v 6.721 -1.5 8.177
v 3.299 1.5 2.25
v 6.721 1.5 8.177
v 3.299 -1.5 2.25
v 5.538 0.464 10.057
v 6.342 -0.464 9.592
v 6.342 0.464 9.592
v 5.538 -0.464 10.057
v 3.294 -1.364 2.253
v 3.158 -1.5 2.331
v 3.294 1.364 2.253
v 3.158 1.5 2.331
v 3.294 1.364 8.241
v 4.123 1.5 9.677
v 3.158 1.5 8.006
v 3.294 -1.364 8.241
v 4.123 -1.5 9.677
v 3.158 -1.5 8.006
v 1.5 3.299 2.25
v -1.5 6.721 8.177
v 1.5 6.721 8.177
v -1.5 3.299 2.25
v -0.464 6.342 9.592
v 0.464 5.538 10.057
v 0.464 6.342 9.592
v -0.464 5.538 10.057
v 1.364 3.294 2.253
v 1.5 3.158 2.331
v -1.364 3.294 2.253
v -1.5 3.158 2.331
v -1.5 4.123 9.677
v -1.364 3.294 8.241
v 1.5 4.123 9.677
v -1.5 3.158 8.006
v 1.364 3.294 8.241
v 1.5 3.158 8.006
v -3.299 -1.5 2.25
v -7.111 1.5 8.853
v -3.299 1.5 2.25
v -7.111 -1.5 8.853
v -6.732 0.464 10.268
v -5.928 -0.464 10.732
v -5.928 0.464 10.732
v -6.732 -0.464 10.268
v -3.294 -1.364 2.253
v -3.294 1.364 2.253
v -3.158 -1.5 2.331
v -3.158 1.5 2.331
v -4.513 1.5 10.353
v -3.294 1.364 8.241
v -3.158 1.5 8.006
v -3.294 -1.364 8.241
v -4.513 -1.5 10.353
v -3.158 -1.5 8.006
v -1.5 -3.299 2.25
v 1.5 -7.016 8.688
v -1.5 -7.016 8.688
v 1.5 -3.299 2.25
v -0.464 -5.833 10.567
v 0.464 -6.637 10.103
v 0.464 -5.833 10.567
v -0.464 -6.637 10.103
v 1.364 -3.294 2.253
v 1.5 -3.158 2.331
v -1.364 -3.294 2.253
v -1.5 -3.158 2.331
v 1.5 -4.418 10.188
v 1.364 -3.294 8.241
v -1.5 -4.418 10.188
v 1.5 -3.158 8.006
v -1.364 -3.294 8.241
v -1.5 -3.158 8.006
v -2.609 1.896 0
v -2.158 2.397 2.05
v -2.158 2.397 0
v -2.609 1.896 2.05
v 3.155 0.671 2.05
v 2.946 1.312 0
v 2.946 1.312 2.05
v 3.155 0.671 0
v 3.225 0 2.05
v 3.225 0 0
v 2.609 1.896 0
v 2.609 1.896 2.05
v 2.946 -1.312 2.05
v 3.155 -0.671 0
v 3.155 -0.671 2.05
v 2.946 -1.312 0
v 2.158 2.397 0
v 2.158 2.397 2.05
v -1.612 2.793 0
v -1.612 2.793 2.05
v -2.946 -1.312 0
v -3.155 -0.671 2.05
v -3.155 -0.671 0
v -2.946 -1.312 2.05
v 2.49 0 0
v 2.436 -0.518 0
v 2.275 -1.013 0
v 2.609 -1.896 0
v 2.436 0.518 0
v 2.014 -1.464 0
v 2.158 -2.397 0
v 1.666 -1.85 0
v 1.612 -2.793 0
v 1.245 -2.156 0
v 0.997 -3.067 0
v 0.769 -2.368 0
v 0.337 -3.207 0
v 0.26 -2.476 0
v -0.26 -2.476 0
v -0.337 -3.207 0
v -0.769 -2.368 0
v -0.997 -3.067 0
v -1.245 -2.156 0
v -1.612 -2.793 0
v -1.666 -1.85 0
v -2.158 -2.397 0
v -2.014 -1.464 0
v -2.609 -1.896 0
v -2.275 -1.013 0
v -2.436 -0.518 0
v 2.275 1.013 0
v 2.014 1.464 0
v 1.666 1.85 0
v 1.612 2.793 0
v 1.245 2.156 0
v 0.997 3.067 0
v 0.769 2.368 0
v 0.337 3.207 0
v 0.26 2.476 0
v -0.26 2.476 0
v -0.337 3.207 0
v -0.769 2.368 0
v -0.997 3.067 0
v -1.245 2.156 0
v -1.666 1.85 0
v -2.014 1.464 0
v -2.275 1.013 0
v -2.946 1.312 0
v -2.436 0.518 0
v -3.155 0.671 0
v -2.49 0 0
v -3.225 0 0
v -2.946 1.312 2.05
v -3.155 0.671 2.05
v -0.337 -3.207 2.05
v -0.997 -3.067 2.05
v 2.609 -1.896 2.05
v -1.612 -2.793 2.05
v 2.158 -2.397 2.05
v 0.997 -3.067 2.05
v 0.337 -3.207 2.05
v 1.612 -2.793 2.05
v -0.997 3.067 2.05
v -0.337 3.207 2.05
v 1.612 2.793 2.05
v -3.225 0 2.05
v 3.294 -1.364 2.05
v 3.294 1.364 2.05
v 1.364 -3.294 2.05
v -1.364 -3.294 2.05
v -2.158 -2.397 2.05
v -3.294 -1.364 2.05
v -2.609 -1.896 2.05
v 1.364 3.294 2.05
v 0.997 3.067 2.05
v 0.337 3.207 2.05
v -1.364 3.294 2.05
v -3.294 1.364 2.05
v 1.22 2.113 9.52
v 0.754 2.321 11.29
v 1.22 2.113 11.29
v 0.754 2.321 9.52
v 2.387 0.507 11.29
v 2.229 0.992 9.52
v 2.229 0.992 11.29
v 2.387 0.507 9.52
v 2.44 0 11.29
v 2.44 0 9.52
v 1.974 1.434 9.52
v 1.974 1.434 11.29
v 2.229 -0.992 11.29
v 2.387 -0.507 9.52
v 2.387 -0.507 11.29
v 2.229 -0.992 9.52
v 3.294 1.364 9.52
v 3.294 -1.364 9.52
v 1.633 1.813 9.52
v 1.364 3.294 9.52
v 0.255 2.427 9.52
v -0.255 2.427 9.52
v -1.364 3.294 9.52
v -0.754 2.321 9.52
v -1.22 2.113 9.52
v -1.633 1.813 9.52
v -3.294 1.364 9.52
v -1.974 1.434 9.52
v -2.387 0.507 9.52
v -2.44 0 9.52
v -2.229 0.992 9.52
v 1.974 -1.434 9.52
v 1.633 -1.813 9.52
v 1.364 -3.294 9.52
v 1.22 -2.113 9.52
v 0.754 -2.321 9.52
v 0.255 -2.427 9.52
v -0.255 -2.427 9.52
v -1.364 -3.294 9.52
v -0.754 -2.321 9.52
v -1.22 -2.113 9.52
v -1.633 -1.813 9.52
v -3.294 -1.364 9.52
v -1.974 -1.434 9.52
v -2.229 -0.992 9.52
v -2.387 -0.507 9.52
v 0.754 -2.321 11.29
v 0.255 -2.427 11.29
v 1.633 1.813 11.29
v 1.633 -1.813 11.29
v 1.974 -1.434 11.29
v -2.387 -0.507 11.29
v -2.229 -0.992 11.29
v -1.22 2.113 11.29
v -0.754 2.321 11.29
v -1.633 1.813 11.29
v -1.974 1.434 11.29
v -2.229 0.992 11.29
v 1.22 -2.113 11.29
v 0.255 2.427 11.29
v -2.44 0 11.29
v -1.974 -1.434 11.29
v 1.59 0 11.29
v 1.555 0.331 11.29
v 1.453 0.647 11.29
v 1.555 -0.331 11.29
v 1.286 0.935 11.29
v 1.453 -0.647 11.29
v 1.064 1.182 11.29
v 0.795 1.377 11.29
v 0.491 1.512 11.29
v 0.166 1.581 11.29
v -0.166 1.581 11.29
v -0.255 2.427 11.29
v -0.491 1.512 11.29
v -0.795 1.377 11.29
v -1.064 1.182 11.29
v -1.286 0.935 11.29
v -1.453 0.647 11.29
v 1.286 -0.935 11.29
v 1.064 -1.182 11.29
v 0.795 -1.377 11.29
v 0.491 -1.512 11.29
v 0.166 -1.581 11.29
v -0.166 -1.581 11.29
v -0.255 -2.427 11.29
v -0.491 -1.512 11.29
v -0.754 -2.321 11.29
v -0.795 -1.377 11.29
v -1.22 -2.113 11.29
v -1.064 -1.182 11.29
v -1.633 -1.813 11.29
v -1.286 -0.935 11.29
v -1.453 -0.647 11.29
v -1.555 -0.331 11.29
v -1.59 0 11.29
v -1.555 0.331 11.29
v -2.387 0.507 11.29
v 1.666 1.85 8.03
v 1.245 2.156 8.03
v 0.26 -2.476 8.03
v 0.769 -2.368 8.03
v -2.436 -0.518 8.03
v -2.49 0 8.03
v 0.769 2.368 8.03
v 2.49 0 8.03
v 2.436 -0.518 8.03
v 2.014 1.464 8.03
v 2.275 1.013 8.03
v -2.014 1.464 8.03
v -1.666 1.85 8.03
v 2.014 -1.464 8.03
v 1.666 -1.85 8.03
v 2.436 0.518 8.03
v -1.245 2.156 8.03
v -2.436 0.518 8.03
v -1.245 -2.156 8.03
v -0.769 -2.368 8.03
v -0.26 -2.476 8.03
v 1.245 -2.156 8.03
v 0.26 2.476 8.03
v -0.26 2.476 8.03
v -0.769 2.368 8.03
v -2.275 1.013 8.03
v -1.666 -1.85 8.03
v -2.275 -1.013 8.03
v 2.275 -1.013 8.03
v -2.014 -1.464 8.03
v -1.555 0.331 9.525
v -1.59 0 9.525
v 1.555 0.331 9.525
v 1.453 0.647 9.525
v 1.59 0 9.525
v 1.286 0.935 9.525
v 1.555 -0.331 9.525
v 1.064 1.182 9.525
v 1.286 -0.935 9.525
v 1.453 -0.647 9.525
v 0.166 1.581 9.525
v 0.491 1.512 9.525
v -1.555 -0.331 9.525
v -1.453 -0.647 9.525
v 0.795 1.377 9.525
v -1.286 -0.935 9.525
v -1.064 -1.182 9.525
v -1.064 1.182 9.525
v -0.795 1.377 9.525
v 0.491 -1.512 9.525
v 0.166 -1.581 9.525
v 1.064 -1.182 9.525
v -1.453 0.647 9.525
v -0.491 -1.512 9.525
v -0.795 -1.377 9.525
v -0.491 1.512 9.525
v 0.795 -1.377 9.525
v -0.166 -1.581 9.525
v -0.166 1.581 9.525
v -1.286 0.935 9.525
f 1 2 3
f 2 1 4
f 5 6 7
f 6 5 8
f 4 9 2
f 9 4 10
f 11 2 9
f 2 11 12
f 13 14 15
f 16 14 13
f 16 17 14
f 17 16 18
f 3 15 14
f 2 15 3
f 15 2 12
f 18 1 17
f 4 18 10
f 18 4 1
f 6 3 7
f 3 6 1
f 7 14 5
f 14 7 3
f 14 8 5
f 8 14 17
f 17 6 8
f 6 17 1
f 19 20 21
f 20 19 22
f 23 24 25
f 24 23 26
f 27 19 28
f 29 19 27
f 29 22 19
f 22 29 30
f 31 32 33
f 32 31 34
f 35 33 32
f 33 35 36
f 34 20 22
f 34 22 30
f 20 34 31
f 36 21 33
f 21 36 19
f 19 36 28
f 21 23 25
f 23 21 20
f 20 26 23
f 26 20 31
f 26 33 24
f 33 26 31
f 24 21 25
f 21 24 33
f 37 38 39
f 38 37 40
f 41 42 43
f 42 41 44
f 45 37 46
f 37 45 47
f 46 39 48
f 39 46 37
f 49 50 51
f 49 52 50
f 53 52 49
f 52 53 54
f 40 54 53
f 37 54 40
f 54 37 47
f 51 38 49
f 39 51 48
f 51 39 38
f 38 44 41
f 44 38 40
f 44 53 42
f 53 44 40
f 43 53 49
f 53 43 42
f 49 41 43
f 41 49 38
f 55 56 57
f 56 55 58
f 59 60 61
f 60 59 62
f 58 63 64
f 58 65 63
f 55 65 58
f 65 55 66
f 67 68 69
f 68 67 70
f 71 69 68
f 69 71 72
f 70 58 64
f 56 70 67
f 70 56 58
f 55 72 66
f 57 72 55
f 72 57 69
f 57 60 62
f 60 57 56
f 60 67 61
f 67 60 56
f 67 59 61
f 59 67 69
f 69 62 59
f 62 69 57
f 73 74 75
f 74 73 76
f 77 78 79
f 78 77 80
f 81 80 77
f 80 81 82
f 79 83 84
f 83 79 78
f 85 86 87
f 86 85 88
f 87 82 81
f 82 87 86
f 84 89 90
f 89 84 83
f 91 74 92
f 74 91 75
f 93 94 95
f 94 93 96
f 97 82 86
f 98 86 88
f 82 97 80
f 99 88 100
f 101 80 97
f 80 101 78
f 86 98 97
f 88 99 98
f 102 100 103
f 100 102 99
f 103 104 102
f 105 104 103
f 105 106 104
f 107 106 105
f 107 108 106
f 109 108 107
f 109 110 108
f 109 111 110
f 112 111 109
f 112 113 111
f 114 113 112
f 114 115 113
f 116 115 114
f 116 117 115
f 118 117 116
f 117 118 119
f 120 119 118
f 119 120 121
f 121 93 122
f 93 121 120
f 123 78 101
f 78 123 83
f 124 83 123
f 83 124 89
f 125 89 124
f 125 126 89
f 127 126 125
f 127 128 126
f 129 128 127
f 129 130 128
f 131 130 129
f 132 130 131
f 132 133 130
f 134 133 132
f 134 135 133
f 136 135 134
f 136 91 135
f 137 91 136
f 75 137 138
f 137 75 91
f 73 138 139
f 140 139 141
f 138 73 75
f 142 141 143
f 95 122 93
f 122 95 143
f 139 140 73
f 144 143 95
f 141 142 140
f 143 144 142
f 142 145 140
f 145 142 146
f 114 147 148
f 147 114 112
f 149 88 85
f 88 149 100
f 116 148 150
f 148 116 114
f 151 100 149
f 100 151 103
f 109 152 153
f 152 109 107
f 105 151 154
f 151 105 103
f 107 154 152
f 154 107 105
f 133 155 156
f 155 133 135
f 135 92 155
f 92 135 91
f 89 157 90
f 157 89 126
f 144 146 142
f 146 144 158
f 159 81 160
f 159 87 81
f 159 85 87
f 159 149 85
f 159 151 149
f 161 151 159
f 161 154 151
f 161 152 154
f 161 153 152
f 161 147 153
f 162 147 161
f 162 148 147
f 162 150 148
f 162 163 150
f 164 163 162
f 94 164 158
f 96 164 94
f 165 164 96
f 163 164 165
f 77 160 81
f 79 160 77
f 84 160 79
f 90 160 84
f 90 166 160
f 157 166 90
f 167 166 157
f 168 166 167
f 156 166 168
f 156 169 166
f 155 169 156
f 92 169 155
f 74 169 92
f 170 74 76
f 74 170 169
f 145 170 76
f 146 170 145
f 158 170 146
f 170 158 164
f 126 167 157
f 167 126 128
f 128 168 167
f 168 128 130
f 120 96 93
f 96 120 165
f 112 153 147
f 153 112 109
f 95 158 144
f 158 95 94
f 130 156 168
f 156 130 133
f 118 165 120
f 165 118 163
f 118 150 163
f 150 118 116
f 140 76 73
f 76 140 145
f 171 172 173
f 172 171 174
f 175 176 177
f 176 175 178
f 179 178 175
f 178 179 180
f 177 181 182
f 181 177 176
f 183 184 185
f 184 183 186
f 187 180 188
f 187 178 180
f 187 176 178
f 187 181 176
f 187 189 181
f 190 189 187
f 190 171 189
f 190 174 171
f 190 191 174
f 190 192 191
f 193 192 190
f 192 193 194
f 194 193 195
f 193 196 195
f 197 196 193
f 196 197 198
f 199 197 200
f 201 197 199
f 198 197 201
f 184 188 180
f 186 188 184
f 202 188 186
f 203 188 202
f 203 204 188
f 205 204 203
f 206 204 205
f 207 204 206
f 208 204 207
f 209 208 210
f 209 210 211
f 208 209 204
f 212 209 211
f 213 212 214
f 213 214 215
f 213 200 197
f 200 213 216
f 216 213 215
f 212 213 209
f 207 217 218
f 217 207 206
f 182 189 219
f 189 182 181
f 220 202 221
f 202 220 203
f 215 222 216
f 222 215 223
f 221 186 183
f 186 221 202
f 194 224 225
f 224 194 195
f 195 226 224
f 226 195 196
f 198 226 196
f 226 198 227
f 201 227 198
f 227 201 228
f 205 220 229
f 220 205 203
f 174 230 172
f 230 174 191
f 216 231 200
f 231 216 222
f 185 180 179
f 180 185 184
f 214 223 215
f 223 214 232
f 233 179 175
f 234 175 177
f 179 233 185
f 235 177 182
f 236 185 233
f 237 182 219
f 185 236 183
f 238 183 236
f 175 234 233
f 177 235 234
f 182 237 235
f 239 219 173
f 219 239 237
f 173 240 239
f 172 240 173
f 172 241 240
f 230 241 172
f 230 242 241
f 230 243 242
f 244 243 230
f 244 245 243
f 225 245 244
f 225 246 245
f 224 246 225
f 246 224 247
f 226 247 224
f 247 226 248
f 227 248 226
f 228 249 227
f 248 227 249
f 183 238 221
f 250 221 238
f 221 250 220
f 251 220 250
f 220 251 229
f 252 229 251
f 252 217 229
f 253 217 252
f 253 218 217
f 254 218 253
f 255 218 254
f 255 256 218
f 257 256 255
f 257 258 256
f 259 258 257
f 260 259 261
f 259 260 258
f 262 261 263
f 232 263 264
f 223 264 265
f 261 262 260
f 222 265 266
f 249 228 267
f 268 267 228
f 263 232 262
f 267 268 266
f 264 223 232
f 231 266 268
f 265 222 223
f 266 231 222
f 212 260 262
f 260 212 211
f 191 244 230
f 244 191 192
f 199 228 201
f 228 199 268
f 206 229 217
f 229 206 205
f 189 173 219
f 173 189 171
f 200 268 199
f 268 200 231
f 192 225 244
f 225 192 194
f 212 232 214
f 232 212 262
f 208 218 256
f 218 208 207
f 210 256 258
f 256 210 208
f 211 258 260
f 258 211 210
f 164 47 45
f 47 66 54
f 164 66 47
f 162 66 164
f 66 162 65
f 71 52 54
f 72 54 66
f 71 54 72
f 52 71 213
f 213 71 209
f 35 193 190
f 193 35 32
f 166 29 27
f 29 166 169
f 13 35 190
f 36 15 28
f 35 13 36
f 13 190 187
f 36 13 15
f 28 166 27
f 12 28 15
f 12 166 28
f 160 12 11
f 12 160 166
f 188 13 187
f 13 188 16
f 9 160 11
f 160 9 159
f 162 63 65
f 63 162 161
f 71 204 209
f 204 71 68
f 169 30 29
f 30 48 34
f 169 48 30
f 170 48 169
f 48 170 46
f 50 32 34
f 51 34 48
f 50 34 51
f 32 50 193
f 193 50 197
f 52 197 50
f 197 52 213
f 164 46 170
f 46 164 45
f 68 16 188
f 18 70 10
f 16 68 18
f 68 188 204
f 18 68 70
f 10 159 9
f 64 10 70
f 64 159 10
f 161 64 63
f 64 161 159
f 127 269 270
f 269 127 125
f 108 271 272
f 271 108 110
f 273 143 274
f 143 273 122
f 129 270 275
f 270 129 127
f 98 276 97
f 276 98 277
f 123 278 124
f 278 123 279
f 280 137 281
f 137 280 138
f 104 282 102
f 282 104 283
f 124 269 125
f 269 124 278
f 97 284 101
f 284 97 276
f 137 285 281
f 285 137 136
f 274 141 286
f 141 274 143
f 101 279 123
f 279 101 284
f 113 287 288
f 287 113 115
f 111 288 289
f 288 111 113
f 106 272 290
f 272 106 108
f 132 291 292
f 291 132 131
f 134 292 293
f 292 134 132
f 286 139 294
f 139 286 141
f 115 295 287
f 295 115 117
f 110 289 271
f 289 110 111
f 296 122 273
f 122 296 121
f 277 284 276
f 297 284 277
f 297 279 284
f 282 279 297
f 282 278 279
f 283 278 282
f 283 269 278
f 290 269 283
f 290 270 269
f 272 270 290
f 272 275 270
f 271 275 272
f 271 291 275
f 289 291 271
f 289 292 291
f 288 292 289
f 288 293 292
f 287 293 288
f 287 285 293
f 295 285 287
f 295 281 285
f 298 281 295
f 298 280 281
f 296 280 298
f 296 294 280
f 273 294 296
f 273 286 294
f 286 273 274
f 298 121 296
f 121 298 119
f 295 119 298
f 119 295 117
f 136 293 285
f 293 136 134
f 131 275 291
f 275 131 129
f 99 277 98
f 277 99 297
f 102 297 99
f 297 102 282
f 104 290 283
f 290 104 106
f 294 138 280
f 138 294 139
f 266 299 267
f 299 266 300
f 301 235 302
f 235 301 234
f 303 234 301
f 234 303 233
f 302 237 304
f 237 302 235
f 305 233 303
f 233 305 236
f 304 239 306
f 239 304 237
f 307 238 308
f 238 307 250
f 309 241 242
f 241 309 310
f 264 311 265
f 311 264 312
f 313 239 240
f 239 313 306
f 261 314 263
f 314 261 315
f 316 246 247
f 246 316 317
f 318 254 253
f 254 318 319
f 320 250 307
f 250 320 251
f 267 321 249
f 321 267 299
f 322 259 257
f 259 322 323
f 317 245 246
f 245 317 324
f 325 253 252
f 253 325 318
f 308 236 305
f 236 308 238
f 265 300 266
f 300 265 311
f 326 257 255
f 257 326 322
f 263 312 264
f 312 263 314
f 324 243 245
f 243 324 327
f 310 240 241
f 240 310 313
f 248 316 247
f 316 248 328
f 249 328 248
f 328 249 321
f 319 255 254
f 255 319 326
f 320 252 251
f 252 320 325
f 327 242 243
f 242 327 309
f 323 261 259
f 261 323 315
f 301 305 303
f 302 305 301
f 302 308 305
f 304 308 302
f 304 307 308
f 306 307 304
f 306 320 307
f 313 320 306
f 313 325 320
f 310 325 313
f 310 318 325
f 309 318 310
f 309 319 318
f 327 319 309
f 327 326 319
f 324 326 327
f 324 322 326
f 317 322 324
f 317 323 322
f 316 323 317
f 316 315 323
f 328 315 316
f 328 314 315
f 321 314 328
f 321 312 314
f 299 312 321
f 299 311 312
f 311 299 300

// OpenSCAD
module crystal(r = 3, h = 7.88)
{
  difference() {
    translate([0,0,h/2]) cube([r,r,h], center = true);
    translate([r/2,0,h+2.5]) rotate([0,45,0]) cube(5, center = true);
    translate([0,r/2,h+2.5]) rotate([0,45,90]) cube(5, center = true);
    translate([-r/2,0,h+2.5]) rotate([0,45,180]) cube(5, center = true);
    translate([0,-r/2,h+2.5]) rotate([0,45,270]) cube(5, center = true);
  }
}

difference() {
  union() {
    cylinder(r = 6.45/2, h = 2.05, $fn = 30);

    translate([0,0,9.52]) cylinder(r = 4.88/2, h = 1.77, $fn = 30);

    rotate([0,0,22.5]) translate([0,0,2.05]) cylinder(r=7.13/2, h = 7.47, $fn = 8);

    translate([0,0,3]) {
      translate([2,0,0]) rotate([0,30,0]) crystal(h = 7.88);
      translate([0,2,0]) rotate([0,30,90]) crystal(h = 7.88);
      translate([-2,0,0]) rotate([0,30,180]) crystal(h = 8.66);
      translate([0,-2,0]) rotate([0,30,270]) crystal(h = 8.47);
    }
  }

  translate([0,0,-.1]) cylinder(r = 4.98/2, h = 8.13, $fn = 30);

  translate([0,0,9.525]) cylinder(r = 3.18/2, h = 1.77, $fn = 30);

}
